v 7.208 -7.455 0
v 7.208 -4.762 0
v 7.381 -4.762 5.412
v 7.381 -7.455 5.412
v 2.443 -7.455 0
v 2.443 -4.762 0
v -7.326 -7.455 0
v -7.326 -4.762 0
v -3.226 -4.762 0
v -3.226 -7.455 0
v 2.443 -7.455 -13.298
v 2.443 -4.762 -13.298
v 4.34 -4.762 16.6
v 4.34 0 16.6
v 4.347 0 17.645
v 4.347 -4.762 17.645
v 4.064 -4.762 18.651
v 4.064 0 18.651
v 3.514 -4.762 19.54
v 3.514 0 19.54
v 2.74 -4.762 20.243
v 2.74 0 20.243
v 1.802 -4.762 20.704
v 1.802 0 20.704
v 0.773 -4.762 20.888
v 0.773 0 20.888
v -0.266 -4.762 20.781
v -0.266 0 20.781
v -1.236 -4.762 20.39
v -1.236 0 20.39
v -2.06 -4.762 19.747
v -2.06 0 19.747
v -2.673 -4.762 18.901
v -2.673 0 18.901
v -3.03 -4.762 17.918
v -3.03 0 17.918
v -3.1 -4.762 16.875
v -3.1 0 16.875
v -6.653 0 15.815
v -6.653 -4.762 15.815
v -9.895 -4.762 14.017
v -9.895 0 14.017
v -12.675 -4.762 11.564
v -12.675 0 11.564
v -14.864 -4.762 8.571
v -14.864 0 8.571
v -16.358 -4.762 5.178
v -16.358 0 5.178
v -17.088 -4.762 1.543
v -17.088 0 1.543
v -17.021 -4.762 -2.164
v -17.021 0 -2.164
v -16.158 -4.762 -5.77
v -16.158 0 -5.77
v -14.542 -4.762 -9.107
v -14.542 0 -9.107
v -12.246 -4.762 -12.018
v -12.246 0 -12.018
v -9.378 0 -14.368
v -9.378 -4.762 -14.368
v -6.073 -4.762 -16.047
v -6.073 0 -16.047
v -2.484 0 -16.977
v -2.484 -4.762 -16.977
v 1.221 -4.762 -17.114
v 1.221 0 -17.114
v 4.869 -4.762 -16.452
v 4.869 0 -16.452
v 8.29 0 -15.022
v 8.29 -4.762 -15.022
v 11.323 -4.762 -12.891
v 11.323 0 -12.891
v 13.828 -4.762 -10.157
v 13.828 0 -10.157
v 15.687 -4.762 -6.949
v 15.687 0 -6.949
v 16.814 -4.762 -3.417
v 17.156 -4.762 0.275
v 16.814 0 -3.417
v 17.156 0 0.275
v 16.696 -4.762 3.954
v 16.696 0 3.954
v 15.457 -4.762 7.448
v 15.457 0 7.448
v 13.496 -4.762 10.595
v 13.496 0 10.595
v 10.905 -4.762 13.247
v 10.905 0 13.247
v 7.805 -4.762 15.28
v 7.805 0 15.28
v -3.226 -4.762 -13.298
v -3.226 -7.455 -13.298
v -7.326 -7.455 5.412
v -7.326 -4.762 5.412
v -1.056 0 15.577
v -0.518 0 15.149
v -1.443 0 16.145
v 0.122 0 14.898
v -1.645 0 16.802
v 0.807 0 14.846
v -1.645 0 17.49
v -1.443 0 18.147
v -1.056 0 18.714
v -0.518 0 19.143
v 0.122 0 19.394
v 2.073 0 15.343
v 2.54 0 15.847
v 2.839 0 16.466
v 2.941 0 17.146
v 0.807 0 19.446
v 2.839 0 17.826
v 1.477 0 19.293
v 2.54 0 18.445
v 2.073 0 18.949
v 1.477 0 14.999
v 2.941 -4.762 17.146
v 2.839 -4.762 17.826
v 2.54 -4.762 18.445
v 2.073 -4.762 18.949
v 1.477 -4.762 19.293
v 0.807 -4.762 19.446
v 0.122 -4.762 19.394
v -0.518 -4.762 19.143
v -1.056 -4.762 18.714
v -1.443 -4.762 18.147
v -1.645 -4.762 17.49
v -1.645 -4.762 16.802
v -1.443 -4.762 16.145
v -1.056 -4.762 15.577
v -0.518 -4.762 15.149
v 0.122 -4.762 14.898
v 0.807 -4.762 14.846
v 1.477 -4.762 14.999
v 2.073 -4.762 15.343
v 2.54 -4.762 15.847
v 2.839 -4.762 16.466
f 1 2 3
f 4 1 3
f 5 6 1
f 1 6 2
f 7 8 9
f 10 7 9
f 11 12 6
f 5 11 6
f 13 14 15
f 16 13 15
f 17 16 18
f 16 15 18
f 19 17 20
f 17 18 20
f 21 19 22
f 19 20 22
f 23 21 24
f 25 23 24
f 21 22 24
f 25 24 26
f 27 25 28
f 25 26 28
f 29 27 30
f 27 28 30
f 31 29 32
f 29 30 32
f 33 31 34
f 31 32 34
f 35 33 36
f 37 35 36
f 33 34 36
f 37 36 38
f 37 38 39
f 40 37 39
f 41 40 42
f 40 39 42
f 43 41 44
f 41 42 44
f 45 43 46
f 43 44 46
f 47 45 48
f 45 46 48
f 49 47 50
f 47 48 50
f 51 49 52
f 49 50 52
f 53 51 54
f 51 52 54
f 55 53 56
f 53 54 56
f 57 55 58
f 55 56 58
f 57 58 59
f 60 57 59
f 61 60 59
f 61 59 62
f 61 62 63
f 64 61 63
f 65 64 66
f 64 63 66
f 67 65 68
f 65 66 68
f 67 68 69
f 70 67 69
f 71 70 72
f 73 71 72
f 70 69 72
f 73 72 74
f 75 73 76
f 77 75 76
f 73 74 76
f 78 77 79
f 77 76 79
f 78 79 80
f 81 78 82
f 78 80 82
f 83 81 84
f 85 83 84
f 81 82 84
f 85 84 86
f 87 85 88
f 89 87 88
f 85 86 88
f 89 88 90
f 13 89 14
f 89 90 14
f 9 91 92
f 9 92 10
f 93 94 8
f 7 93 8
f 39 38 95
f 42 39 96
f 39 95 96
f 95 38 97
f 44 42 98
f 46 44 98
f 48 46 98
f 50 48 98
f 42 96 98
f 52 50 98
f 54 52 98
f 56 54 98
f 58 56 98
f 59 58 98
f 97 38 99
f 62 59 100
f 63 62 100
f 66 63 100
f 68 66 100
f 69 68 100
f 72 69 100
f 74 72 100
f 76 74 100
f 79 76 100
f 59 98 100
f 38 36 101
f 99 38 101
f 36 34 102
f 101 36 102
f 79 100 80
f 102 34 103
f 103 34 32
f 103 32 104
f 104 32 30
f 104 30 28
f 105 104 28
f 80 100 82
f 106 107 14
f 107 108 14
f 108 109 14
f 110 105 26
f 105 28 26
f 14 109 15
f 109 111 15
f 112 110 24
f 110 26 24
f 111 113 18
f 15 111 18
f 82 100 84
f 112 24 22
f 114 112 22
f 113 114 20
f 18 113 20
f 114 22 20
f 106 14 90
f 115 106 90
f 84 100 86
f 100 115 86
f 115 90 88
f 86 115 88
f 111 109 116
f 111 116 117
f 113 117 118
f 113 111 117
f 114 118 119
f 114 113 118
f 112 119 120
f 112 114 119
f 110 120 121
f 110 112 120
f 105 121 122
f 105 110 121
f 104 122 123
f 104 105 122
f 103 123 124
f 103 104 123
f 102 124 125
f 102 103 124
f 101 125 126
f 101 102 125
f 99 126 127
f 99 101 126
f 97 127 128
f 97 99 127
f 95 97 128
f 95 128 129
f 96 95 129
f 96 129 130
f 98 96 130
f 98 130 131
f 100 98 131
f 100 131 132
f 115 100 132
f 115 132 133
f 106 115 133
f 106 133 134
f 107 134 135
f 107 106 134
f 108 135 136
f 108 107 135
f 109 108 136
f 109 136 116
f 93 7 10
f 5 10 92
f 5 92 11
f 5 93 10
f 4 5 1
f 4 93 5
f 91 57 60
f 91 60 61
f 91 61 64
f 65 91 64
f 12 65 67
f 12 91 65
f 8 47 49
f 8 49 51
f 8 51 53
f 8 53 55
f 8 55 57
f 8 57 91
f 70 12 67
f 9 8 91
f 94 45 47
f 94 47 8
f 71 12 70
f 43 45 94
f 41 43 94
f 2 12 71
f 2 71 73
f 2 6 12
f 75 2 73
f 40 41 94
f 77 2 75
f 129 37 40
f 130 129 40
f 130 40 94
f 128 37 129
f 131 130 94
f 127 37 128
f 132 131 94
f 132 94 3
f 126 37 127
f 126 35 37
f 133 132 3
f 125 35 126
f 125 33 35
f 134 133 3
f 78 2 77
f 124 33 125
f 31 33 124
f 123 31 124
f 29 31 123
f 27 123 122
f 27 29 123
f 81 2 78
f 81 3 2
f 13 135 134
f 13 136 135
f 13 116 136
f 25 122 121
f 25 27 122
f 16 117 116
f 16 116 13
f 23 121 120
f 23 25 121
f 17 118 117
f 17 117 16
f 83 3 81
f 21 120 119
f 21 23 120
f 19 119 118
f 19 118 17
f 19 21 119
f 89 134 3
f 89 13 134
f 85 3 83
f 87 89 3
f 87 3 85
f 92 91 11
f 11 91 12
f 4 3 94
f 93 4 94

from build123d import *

# Parameters (mm, degrees)
F0_R     = 2.306081
F1_DEPTH = 4.7625
F2_W     = 5.668672
F2_H     = 13.29764
F3_DEPTH = 2.6924


with BuildPart() as f1:
    # F0 (on Front) → F1 (new body)
    with BuildSketch(Plane.XZ):
        with BuildLine():
            ThreePointArc((-3.100331, 16.875266), (-0.634898, -17.145949), (4.339878, 16.599763))
            ThreePointArc((4.339878, 16.599763), (0.773477, 20.888408), (-3.100331, 16.875266))
        make_face()
        with Locations((0.634898, 17.145949)):
            Circle(F0_R, mode=Mode.SUBTRACT)
    extrude(amount=F1_DEPTH)

    # F2 (on face) → F3 (join)
    with BuildSketch(Plane.XZ.offset(4.7625)):
        Polygon((-7.326433, 5.411912), (-7.326433, 0), (-3.225957, 0), (2.442715, 0), (6.360534, 0), (7.207565, 0), (7.381472, 5.411912), align=None)
        with Locations((-0.391621, -6.64882)):
            Rectangle(F2_W, F2_H)
    extrude(amount=F3_DEPTH)


solid = f1.part
